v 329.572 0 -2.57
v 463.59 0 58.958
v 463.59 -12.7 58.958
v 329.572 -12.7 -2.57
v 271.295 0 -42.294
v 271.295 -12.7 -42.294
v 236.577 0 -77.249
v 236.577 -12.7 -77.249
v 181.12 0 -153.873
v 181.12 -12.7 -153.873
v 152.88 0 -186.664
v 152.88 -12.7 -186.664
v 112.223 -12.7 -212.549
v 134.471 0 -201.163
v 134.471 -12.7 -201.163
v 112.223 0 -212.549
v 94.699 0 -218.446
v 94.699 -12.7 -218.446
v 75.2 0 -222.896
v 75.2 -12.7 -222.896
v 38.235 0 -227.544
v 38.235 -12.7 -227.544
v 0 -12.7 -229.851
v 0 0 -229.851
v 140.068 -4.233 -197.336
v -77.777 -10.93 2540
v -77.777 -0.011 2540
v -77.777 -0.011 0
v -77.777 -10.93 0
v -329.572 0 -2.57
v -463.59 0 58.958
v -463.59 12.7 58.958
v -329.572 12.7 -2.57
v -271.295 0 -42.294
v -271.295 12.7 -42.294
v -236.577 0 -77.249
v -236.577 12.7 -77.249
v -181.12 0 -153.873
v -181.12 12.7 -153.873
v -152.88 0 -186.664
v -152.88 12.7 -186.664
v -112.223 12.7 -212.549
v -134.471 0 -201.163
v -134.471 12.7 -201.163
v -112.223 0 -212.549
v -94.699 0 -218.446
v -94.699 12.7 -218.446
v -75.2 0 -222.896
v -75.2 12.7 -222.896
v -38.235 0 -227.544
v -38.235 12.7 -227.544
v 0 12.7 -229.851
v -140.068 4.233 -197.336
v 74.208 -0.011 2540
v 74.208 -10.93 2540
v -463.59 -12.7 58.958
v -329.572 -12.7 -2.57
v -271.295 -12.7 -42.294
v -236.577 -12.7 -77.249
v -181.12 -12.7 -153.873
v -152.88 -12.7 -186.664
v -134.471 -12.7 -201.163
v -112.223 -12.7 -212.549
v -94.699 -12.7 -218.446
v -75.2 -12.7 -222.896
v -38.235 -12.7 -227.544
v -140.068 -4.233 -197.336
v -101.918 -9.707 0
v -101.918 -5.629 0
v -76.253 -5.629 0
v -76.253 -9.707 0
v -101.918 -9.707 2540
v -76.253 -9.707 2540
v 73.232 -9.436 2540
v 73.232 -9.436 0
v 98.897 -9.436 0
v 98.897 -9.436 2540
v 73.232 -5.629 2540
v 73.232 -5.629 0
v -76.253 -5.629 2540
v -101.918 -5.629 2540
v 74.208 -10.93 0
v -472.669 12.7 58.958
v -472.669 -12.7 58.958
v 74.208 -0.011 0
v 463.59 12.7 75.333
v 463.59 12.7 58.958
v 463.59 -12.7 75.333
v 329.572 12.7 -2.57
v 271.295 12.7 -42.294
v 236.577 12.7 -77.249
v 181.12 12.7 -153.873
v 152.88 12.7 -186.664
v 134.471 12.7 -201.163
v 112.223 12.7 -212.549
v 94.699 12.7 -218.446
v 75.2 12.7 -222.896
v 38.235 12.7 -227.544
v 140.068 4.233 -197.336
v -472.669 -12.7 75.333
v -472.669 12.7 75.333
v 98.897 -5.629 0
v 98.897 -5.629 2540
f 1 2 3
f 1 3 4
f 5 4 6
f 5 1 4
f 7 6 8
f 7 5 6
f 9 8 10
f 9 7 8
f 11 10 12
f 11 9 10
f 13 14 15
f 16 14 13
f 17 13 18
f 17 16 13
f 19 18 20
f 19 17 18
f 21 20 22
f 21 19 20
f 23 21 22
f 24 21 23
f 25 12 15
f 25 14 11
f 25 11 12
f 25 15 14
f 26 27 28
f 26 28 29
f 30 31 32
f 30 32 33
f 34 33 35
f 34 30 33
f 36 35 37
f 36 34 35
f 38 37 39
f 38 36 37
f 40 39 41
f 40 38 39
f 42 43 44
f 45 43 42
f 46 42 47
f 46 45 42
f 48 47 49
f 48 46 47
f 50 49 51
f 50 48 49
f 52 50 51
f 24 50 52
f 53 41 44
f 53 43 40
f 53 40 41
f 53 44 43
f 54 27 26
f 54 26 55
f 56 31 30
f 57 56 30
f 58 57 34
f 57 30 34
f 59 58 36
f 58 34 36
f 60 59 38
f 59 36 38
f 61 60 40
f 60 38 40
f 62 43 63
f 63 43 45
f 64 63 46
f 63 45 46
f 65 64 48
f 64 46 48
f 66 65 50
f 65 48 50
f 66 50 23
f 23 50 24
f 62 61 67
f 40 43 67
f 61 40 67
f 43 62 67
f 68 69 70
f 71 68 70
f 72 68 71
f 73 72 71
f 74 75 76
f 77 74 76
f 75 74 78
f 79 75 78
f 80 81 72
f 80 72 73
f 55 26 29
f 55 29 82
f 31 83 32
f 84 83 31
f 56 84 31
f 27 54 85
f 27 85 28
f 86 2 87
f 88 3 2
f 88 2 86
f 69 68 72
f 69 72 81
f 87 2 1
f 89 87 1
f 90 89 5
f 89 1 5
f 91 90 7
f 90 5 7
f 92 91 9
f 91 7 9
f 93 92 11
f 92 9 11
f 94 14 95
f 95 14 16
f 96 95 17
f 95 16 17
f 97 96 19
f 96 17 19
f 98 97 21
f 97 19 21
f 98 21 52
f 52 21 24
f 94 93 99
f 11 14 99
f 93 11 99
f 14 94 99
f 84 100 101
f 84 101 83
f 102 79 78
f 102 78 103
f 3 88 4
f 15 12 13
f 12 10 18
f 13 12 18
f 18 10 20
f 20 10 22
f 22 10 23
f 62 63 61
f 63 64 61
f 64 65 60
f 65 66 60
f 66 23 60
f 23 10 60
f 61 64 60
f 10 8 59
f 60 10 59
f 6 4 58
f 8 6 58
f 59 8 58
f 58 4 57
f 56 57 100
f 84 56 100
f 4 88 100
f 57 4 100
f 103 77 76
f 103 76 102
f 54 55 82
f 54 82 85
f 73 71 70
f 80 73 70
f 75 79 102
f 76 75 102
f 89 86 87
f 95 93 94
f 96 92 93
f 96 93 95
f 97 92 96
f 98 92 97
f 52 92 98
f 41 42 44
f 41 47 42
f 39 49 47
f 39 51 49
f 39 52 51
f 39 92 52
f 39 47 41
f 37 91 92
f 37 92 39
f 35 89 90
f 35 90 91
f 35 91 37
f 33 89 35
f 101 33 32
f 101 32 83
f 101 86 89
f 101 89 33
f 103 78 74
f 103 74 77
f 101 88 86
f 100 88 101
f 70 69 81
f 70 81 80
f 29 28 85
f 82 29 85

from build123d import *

# Parameters (mm, degrees)
F1_DEPTH = 2540
F3_DEPTH = 12.7
F4_W     = 25.6649032235
F4_H     = 4.0781614371
F5_DEPTH = 2540
F4_W_2   = 25.6649181247
F4_H_2   = 3.8064057007


with BuildPart() as f1:
    # F0 (on Top) → F1 (new body)
    with BuildSketch(Plane.XY):
        Polygon((74.2080868222, -0.0106971711), (-77.7766420506, -0.0106971711), (-77.7766420506, -3.479225561), (-77.7766420506, -10.9302010387), (74.2080868222, -10.9302010387), (74.2080868222, -3.479225561), align=None)
    extrude(amount=F1_DEPTH)


with BuildPart() as f3:
    # F2 (on Front) → F3 (new body, symmetric)
    with BuildSketch(Plane.XZ):
        with BuildLine():
            add(Edge.make_bspline(
                [(463.5899960995, 58.9580051601), (384.1037928263, 26.2555374725), (236.7053720041, -34.3875917202), (159.1783455408, -221.9154242441), (51.1824494287, -227.2994788478), (0, -229.851141572)],
                knots=[0, 0, 0, 0, 0.3810833054, 0.7066770724, 1, 1, 1, 1], degree=3))
            Line((463.5899960995, 58.9580051601), (-463.5899960995, 58.9580051601))
            add(Edge.make_bspline(
                [(-463.5899960995, 58.9580051601), (-384.1037928263, 26.2555374725), (-236.7053720041, -34.3875917202), (-159.1783455408, -221.9154242441), (-51.1824494287, -227.2994788478), (0, -229.851141572)],
                knots=[0, 0, 0, 0, 0.3810833054, 0.7066770724, 1, 1, 1, 1], degree=3))
        make_face()
        Polygon((-463.5899960995, 58.9580051601), (463.5899960995, 58.9580051601), (463.5899960995, 74.7133120894), (463.5899960995, 75.33300668), (-472.669005394, 75.33300668), (-472.669005394, 58.9580051601), align=None)
    extrude(amount=F3_DEPTH, both=True)


with BuildPart() as f5:
    # F4 (on Top) → F5 (new body)
    with BuildSketch(Plane.XY):
        with Locations((-89.0850834548, -7.6683352236)):
            Rectangle(F4_W, F4_H)
    extrude(amount=F5_DEPTH)


with BuildPart() as f5b:
    # F4 (on Top) → F5, piece 2 (new body)
    with BuildSketch(Plane.XY):
        with Locations((86.0643349588, -7.5324573554)):
            Rectangle(F4_W_2, F4_H_2)
    extrude(amount=F5_DEPTH)


solid = Compound([f1.part, f3.part, f5.part, f5b.part])
